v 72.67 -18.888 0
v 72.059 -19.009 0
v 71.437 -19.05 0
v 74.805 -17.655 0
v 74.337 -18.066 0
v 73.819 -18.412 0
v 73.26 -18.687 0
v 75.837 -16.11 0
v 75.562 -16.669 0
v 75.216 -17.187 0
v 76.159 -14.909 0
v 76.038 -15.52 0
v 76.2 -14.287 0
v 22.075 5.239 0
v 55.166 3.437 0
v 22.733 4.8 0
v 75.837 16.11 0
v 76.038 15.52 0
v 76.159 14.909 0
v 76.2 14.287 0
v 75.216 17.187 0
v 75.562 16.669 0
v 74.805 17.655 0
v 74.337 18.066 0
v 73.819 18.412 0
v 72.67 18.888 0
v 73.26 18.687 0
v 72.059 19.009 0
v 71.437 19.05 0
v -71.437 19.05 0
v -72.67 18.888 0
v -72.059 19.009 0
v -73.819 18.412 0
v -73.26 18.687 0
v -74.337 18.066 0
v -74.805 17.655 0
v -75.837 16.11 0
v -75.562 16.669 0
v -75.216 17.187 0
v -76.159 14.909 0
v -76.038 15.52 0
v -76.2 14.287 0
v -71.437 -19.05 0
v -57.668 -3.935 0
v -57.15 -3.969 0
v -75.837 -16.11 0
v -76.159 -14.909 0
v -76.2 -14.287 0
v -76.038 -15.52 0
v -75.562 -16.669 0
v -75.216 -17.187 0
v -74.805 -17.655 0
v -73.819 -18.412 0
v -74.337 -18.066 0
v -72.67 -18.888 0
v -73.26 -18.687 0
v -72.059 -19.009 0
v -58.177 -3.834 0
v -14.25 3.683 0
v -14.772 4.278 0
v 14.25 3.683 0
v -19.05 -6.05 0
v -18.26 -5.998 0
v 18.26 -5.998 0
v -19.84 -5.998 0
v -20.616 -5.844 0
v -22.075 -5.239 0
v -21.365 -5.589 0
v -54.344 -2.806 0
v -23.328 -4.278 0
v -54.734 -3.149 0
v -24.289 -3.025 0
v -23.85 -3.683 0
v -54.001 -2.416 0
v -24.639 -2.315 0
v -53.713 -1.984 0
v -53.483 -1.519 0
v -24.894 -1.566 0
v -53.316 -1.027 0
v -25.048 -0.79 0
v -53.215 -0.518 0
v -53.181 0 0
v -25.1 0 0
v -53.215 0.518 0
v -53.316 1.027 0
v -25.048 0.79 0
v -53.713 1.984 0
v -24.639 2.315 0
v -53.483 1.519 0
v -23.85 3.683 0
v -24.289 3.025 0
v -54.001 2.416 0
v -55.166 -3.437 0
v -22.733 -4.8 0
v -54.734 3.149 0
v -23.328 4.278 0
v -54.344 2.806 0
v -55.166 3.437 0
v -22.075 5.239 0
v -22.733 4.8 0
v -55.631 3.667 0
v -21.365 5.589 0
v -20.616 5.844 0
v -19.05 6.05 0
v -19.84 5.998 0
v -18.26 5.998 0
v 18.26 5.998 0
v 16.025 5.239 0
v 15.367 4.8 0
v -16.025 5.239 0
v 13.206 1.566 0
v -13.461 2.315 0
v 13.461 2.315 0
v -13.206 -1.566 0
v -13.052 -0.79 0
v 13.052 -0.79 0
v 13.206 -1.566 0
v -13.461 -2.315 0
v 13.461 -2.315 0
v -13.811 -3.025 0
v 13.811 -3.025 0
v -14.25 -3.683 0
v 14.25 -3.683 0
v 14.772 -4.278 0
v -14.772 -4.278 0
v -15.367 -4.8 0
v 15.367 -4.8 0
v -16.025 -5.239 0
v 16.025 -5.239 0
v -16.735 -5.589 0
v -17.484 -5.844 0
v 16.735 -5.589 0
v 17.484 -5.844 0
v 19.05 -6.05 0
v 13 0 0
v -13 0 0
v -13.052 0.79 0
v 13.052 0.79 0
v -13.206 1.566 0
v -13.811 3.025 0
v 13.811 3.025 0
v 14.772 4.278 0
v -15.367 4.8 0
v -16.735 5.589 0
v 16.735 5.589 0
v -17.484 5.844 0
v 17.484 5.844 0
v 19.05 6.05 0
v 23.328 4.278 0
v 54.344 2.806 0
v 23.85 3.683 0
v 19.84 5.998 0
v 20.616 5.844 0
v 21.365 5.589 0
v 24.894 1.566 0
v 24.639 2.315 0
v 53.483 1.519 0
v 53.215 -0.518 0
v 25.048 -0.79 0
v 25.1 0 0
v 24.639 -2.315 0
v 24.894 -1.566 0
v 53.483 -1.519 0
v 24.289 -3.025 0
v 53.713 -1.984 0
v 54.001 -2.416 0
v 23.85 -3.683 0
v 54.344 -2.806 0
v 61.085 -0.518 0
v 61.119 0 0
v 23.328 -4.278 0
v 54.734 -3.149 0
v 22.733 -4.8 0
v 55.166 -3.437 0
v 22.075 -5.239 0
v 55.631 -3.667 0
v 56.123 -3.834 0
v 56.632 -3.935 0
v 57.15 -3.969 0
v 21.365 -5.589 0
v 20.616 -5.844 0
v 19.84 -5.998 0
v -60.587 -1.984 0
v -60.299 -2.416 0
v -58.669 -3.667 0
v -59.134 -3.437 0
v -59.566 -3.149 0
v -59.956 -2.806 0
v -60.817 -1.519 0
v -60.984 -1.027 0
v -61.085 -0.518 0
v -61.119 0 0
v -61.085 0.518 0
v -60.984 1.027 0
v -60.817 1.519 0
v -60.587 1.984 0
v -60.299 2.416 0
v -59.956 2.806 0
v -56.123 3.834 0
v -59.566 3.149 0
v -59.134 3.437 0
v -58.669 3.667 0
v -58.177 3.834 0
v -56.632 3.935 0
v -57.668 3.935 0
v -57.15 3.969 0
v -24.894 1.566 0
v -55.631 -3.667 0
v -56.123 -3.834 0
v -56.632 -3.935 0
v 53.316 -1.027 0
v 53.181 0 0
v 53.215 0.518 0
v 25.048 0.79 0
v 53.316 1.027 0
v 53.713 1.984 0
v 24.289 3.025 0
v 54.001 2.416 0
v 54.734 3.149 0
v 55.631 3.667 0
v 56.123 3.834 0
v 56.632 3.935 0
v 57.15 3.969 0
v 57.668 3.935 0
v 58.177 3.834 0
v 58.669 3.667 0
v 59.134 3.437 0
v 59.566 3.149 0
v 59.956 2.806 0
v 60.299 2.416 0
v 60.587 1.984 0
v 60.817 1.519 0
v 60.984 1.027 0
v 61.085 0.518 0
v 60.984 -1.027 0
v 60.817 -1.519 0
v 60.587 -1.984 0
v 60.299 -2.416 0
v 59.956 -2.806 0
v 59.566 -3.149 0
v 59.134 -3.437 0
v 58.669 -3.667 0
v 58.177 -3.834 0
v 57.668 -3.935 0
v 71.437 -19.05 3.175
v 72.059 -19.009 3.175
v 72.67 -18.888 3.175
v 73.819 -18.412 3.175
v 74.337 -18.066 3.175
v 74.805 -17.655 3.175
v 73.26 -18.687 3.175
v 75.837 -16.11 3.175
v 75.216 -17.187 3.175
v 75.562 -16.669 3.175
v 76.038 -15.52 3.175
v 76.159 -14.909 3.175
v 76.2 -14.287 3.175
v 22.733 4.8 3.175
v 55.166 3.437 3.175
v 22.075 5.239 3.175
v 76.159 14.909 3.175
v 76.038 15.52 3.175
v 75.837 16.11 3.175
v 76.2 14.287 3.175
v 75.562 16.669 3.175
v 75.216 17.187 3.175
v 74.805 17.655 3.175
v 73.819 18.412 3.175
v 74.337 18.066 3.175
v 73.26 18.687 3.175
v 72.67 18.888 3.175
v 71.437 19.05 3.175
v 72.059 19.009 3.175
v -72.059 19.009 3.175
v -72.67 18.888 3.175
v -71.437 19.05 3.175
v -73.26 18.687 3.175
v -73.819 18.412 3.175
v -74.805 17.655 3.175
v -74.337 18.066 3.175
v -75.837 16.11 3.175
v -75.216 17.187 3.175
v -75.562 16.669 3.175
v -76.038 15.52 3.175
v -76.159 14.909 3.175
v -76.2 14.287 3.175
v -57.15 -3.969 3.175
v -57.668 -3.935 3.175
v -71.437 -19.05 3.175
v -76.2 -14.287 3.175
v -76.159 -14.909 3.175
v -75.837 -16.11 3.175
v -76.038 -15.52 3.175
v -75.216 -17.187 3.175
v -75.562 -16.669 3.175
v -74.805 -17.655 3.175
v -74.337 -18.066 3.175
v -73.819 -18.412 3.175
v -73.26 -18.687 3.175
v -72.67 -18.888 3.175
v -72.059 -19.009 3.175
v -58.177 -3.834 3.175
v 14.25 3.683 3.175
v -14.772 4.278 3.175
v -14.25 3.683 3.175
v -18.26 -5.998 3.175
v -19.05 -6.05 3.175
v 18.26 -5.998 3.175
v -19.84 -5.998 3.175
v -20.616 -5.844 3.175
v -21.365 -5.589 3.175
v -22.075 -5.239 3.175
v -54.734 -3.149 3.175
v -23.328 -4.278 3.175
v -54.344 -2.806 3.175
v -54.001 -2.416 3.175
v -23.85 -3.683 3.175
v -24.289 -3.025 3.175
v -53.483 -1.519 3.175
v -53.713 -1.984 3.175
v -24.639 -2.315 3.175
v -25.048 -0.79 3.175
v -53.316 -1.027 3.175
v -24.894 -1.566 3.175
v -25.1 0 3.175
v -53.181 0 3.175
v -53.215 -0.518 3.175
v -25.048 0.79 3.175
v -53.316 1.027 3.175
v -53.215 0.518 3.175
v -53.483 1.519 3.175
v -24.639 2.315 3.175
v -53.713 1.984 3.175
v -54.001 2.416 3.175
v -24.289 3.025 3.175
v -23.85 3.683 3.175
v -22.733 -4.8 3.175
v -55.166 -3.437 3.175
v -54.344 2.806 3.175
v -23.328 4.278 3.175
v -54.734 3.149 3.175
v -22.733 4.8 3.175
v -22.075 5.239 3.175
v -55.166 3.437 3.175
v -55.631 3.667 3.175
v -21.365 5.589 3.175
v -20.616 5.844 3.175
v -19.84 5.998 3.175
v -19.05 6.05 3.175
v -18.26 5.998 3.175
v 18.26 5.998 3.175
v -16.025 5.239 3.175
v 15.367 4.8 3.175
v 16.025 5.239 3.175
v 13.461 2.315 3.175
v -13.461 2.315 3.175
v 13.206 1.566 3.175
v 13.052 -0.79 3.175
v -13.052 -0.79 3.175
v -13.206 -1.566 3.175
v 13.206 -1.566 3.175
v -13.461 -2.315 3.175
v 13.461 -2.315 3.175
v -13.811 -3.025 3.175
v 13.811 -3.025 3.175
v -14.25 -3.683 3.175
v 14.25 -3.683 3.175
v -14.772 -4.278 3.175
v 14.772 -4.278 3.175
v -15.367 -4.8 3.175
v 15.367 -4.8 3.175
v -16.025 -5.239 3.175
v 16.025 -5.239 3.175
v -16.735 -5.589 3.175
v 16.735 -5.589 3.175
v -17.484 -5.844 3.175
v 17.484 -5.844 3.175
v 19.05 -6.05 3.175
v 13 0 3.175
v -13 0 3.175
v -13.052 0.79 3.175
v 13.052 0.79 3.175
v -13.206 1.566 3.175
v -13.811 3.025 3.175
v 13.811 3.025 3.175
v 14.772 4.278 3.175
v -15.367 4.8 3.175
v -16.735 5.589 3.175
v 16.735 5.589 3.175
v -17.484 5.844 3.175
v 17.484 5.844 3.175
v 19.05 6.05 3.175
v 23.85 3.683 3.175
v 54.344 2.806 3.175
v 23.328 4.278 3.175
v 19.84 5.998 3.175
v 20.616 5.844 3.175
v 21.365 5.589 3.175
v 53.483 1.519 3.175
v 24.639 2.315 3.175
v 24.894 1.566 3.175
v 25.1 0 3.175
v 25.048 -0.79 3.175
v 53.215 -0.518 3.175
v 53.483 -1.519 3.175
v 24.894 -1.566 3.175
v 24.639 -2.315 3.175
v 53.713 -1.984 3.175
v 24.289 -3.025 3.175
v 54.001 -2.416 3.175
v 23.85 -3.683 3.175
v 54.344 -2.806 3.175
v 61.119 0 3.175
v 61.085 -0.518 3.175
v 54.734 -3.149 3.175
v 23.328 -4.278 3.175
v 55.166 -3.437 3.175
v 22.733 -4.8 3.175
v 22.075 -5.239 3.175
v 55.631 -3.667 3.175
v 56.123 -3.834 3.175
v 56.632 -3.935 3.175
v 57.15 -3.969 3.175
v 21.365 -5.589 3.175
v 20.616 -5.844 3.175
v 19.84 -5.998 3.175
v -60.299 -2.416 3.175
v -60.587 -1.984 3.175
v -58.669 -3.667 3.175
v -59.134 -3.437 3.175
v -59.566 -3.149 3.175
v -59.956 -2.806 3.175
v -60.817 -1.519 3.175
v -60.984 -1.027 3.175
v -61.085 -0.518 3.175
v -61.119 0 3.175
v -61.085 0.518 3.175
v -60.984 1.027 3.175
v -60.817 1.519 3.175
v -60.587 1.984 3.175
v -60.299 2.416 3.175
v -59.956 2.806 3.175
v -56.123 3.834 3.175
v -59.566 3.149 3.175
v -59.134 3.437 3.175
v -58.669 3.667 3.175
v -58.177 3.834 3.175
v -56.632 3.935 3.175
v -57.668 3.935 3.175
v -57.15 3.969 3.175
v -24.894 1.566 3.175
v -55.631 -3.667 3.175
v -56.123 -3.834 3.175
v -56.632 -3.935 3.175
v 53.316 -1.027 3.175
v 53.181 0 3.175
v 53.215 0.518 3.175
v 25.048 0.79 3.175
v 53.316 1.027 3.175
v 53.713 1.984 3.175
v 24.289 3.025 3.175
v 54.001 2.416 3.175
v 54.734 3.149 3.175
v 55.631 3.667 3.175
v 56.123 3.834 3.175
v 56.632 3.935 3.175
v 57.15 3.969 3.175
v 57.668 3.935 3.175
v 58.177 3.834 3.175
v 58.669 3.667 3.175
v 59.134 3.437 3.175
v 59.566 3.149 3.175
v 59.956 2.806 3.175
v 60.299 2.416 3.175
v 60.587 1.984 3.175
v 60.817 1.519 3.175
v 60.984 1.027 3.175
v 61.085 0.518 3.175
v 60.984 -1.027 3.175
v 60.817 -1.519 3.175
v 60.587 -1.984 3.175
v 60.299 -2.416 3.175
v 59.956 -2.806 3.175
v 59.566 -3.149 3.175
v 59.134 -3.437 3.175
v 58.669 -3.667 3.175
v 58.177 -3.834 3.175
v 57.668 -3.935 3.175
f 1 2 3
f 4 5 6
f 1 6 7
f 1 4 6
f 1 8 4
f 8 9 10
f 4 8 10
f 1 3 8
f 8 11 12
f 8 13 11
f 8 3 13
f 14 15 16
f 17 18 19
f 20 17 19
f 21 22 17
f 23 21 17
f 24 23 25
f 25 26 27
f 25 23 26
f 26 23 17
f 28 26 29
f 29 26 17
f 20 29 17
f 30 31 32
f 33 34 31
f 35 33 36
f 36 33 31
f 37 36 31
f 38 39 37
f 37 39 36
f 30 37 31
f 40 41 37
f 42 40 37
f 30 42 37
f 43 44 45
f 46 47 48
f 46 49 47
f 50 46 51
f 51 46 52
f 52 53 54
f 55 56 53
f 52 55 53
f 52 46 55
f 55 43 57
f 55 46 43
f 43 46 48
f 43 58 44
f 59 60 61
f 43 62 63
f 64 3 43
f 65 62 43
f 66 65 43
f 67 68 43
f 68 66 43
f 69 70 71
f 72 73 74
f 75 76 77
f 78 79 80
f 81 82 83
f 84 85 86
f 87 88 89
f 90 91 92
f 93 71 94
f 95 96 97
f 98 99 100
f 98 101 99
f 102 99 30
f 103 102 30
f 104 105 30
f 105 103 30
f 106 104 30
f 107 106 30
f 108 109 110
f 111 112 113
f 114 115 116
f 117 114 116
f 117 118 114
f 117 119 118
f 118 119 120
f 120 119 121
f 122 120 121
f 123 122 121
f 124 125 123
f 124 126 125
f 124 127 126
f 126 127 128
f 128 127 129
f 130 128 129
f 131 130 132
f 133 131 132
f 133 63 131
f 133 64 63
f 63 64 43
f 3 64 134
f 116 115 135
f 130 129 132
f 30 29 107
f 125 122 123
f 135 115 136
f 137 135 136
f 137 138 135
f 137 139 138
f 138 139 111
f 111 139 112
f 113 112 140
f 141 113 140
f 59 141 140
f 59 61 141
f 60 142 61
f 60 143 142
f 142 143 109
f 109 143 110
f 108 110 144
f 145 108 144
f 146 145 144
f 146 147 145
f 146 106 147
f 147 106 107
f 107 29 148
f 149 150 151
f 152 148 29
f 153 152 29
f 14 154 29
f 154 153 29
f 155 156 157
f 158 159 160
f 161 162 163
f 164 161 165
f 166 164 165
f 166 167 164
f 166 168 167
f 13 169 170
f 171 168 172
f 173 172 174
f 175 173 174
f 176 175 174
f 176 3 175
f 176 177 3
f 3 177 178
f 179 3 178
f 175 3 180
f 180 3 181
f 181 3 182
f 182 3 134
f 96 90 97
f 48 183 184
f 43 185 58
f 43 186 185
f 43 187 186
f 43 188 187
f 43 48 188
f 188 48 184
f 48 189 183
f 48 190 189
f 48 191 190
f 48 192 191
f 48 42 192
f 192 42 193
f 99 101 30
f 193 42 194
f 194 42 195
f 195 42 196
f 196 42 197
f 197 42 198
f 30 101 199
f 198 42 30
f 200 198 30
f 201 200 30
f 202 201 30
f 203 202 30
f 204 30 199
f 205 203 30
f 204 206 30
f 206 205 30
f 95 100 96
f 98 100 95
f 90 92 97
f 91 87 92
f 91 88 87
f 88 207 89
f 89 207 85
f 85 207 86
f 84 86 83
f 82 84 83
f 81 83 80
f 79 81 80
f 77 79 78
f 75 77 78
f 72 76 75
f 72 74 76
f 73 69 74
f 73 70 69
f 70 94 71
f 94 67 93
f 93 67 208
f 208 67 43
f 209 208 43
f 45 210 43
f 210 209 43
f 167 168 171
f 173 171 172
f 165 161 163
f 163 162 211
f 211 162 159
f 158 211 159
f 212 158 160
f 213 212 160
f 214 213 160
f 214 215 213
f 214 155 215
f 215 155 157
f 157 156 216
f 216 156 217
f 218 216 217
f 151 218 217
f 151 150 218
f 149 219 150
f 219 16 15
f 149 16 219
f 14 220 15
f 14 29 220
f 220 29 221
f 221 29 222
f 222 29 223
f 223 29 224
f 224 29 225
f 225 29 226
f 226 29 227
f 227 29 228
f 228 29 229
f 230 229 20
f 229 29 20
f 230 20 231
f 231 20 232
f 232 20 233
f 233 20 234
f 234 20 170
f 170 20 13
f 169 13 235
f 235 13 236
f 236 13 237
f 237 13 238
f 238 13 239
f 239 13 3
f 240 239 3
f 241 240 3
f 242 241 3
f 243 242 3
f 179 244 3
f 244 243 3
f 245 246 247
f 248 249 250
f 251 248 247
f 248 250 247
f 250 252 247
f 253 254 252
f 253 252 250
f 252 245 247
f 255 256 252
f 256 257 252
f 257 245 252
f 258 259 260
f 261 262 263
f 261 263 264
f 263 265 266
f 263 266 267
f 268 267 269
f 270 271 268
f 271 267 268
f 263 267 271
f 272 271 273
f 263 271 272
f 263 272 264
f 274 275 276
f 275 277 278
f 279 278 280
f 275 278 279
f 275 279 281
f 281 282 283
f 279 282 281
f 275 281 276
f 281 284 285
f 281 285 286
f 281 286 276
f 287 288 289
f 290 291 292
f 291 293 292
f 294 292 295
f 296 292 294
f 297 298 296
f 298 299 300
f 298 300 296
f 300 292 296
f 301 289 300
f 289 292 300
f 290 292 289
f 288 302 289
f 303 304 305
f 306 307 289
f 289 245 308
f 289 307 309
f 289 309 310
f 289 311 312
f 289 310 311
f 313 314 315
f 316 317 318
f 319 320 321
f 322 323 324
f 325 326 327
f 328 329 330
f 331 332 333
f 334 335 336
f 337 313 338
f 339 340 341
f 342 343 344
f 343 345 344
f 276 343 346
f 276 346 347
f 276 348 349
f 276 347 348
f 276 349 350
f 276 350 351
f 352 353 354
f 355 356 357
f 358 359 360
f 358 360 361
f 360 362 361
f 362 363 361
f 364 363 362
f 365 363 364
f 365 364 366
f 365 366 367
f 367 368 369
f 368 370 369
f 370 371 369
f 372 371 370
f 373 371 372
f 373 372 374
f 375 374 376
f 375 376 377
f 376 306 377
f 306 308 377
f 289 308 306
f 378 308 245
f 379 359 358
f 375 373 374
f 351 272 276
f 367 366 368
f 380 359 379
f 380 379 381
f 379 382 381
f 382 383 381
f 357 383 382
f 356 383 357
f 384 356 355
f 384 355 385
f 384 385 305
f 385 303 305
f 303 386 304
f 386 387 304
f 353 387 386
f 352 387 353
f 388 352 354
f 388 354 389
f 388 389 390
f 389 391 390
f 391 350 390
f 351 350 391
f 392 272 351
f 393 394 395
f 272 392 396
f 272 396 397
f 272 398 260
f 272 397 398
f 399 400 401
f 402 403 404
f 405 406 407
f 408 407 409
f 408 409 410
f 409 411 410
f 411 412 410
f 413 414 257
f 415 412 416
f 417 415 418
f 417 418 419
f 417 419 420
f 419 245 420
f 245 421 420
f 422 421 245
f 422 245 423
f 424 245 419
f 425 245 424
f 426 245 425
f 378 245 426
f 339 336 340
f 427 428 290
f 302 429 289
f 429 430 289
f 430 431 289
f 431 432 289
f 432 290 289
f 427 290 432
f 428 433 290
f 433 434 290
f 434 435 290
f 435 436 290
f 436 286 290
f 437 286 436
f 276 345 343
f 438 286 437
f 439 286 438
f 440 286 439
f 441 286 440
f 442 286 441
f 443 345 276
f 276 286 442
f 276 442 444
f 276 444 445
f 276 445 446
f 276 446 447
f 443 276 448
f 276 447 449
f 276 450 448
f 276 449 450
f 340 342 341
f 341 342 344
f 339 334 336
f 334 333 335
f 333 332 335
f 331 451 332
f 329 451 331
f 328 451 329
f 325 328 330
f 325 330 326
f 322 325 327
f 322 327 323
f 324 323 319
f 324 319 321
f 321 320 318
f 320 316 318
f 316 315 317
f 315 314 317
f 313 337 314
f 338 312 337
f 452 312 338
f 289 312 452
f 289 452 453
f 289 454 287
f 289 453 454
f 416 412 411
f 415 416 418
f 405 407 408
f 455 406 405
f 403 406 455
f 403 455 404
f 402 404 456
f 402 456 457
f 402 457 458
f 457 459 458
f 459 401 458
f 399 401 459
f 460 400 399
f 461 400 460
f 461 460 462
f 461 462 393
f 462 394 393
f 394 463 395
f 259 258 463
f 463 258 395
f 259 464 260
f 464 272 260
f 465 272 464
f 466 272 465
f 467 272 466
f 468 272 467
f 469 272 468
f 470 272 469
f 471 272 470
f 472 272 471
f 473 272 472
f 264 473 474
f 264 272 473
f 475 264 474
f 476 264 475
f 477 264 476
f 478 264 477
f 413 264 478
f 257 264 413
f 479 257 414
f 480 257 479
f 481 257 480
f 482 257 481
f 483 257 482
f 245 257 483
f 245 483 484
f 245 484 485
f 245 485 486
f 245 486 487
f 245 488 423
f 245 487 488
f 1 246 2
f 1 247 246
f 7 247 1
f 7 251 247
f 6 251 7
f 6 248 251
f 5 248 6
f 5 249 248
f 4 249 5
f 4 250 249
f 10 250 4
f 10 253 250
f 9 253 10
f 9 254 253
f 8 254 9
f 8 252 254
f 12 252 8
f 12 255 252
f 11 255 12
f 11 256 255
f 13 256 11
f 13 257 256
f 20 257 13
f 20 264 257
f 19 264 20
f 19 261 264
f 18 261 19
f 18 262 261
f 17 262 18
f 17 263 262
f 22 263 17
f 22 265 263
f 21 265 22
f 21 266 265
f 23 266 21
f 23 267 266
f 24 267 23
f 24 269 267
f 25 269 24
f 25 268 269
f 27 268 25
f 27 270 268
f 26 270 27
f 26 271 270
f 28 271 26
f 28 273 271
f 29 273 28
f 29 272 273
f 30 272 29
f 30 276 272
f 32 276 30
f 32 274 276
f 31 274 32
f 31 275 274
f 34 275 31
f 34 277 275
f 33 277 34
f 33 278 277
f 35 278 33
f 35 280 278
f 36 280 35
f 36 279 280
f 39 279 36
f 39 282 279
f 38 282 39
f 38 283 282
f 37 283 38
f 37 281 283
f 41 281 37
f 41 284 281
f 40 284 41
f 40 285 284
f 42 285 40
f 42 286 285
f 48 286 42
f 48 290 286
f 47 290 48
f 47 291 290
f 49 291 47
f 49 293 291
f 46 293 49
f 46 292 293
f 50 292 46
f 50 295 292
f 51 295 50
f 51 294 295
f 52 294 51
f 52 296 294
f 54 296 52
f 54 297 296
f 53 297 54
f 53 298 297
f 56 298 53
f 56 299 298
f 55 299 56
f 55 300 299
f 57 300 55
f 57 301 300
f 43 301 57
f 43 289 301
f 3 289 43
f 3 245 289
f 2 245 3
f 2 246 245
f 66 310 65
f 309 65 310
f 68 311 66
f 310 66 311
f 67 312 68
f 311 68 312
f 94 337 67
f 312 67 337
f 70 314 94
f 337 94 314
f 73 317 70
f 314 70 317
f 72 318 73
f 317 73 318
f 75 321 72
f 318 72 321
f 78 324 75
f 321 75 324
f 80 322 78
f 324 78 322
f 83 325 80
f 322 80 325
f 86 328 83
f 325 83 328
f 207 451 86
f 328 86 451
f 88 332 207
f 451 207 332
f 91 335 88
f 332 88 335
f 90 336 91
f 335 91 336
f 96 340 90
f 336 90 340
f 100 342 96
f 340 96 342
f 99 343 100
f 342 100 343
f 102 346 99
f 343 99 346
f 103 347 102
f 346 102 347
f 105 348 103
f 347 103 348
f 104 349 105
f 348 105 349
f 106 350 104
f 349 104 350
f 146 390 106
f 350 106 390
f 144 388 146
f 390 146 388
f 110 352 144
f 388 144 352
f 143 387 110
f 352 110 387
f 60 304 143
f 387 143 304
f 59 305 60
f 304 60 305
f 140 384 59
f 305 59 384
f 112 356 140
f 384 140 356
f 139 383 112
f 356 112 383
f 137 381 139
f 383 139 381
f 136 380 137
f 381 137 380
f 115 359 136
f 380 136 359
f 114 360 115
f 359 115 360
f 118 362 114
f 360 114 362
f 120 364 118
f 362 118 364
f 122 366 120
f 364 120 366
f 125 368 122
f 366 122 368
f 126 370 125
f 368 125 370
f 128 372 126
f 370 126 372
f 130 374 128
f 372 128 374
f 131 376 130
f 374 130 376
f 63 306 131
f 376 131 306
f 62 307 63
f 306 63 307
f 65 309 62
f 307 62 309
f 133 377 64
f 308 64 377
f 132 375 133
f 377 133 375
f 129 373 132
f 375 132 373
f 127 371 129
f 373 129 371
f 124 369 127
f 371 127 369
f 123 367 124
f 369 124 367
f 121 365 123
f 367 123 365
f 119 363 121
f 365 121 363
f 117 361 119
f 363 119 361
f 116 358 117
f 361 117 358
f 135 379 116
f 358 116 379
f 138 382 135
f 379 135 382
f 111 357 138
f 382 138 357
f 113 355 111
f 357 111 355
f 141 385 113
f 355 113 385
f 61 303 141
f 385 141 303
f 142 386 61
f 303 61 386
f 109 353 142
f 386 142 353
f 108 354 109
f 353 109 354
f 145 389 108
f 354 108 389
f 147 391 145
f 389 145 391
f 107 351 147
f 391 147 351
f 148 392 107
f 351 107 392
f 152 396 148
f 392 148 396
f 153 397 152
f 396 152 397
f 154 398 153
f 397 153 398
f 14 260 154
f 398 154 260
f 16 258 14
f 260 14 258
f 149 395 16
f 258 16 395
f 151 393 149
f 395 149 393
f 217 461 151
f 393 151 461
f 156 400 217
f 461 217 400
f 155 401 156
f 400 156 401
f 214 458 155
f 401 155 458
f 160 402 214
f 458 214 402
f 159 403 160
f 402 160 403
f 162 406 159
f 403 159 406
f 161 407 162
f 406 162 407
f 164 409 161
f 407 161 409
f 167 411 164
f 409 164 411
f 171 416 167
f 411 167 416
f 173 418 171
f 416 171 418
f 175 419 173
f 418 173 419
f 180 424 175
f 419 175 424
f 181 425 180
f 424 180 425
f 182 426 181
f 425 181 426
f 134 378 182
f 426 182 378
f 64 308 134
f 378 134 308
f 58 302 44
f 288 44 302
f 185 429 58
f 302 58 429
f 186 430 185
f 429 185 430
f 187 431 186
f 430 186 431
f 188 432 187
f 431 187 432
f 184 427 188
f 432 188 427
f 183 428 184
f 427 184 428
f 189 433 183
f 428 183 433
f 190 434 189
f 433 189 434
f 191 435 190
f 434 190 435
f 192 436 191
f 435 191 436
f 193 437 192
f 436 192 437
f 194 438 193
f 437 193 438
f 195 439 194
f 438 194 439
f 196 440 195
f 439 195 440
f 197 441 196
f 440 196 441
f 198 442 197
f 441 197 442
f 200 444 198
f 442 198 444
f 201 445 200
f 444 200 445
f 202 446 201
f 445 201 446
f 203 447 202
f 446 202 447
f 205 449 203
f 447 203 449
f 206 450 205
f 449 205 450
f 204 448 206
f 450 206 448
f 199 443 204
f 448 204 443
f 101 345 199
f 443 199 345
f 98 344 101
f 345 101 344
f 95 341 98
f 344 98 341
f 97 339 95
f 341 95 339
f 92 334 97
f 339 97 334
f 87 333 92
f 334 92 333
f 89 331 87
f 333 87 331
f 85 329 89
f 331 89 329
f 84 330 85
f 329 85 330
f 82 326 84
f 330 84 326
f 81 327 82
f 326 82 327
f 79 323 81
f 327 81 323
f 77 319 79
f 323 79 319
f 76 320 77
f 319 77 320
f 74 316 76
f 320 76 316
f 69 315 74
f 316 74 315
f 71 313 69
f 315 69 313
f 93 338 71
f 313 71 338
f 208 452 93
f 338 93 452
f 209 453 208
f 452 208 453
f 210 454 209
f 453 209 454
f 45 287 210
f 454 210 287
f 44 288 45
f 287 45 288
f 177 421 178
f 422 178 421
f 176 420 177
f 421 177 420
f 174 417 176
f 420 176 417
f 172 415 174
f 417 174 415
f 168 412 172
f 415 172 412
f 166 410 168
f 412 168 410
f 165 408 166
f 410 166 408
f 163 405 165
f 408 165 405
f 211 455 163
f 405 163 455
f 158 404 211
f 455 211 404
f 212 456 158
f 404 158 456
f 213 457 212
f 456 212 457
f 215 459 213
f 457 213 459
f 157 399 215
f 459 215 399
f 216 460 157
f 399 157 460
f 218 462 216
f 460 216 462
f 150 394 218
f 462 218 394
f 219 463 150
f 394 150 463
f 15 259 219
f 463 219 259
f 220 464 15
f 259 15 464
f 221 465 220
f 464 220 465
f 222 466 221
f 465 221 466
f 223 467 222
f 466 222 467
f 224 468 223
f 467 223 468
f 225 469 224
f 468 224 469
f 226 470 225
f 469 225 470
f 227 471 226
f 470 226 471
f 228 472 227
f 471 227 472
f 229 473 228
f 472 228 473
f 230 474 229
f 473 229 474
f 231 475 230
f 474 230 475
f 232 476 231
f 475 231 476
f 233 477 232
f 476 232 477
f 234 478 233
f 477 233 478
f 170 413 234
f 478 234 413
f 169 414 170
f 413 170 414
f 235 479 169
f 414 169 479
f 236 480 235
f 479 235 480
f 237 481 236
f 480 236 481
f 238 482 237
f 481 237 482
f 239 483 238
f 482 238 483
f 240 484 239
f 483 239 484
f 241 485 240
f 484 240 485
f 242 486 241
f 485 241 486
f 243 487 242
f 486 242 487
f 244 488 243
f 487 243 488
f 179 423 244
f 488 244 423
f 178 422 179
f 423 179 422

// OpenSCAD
// file: ../lib/TOGUnitTable-v1.scad
// TOGUnitTable-v1.1.0 - Library for handling 'complex amounts' in the form of [multiplier, unit name], e.g. [1.5, "inch"]
//
// 2023-07-01: the following 'annotation' is something I just made up,
// but is intended as a way for future packaging tools to know that it's 'safe'
// (because everything has been somewhat namespaced) to turn a `use <x>`
// into an `include <x>`, making it inlinable:
// safe-to-include: true
// 
// Versions:
// v1.0.0:
// - Created it.
// v1.1.0:
// - Add optional 'dbgctxstr' parameter to unit decoding functions, for better error messages
// 
// Naming convention:
// Doing 'OO without classes', here.
// Fully qualified name = class or package name + "__" + member name
// Class or package name may itself be namespaced, and class names may double as package names.
// Here, tog_unittable names both a class and a package.

// Demo unit table uses 'micrometer' as the base unit
// in order to keep multipliers as integers as much as possible.
tog_unittable__demo_unit_table = [
	["um",    [    1   ,   "um"], "micrometer" ],
	["mm",    [ 1000   ,   "um"], "millimeter" ],
	["inch",  [25400   ,   "um"], "inch"       ],
	["u",     [    1/16, "inch"], "model unit" ], // As used by TGx9 et al
	["atom",  [    8   ,    "u"], "model atom" ],
	["chunk", [    3   , "atom"], "model chunk"],
];

use <./DbgCtxStrLib1.scad>

function tog_unittable__list__filter(list, predicate) = [
	for( item=list ) if( predicate(item) ) item
];
function tog_unittable__list__first(list, on_error) =
	len(list) > 0 ? list[0] : on_error();

function tog_unittable__unit_value_ca(unit_table, unit_name, dbgctxstr=undef) =
	tog_unittable__list__first(
		tog_unittable__list__filter(unit_table, function (entry) entry[0] == unit_name),
		function () assert(false,
			str("Did not find entry for unit '", unit_name, "' in unit table", dbgctxstr_errmsg_suffix(dbgctxstr))
		)
	)[1];

function tog_unittable__ca__is_valid( ca ) =
	is_list(ca) && len(ca) == 2;

// Break down 'amount' until it is in a base unit (one which is defined in terms of itself)
function tog_unittable__simplify_ca(unit_table, amount, dbgctxstr=undef) =
	assert( tog_unittable__ca__is_valid(amount), str(amount, " is not a valid Complex Amount (should be [numeric_value, \"unit_name\"])", dbgctxstr=dbgctxstr) )
	let( unit_value_ca = tog_unittable__unit_value_ca(unit_table, amount[1], dbgctxstr=dbgctxstr) )
	unit_value_ca[1] == amount[1] ? amount :
		tog_unittable__simplify_ca(unit_table, [amount[0] * unit_value_ca[0], unit_value_ca[1]]);

function tog_unittable__divide_ca(unit_table, numerator, denominator, dbgctxstr=undef) =
	let(
		numerator_base_ca   = tog_unittable__simplify_ca(unit_table, numerator, dbgctxstr=dbgctxstr),
		denominator_base_ca = tog_unittable__simplify_ca(unit_table, denominator, dbgctxstr=dbgctxstr)
	)
	assert(numerator_base_ca[1] == denominator_base_ca[1], str("Different base units found for ", numerator[1], " and ", denominator[1]))
	numerator_base_ca[0] / denominator_base_ca[0];	

assert(tog_unittable__divide_ca(tog_unittable__demo_unit_table, [1,   "mm"], [  1, "mm"]) ==     1   );
assert(tog_unittable__divide_ca(tog_unittable__demo_unit_table, [1,   "mm"], [  1, "um"]) ==  1000   );
assert(tog_unittable__divide_ca(tog_unittable__demo_unit_table, [1, "inch"], [  1, "um"]) == 25400   );
assert(tog_unittable__divide_ca(tog_unittable__demo_unit_table, [1, "inch"], [  1, "mm"]) ==    25.4 );
assert(tog_unittable__divide_ca(tog_unittable__demo_unit_table, [1, "inch"], [254, "um"]) ==   100   );
assert(tog_unittable__divide_ca(tog_unittable__demo_unit_table, [1,    "u"], [  1, "um"]) ==  1587.5 );
// file: ../lib/TOGStringLib1.scad
// TOGStringLib1.7
// 
// Functions for parsing quantities
// and other misc. string handling.
// 
// v1.5
// - togstr1_parse_quantity will treat unit-only strings as meaning 1/1 of that unit.
//   e.g. togstr1_parse_quantity("foot") = [[[1,1], "foot", 4]]
// v1.6:
// - togstr1_parse_quantity allows unit name to be omitted when quantity is zero and $togunits1_default_unit is defined
// v1.7:
// - Add optional 'dbgctxstr' parameter to unit decoding functions, for better error messages
// 
// Globals: $togunits1_default_unit - affects what 'unit' is returned
// when interpreting numbers or strings that lack the unit.


function togstr1__todo(message) = assert(false, str("TODO: ", message));

module togstr1__assert_eq(a, b) {
	if( a != b ) {
		assert( a == b, str(a, " != ", b) );
	}
}



function togstr1_slice(source, i0, i1) =
	i0 == i1 ? "" :
	str(source[i0], togstr1_slice(source, i0+1, i1));

function togstr1_tokenize(source, sep, maxcount=9999, i=0, tokenstart=0) =
	len(source) == i ? (
		(tokenstart < i) ? [togstr1_slice(source, tokenstart, i)] : []
	) :
	source[i] == sep ? (
		(tokenstart < i) ? concat([togstr1_slice(source, tokenstart, i)], togstr1_tokenize(source, sep, maxcount-1, i+1, i+1)) :
		togstr1_tokenize(source, sep, maxcount, i+1, i+1)
	) :
	maxcount <= 1 ? [togstr1_slice(source, tokenstart, len(source))] :
	togstr1_tokenize(source, sep, maxcount, i+1, tokenstart);

togstr1__assert_eq( ["foo","bar","baz"], togstr1_tokenize("foo-bar-baz", "-") );
// Duplicate delimiters are ignored
togstr1__assert_eq( ["foo","bar","baz"], togstr1_tokenize("foo--bar--baz", "-") );
// Trailing delimiters are ignored
togstr1__assert_eq( ["foo","bar","baz"], togstr1_tokenize("foo--bar--baz--", "-") );
// Leading delimiters are ignored
togstr1__assert_eq( ["foo","bar","baz"], togstr1_tokenize("--foo--bar--baz", "-") );
// Can limit number of tokens returned
togstr1__assert_eq( ["foo","bar-baz"], togstr1_tokenize("foo-bar-baz", "-", 2) );
togstr1__assert_eq( ["foo","bar-baz"], togstr1_tokenize("--foo--bar-baz", "-", 2) );
togstr1__assert_eq( ["foo","bar--baz"], togstr1_tokenize("--foo--bar--baz", "-", 2) );
togstr1__assert_eq( ["foo"], togstr1_tokenize("--foo--", "-", 2) );




/** \d+ -> [num, end_index] */
function togstr1_parse_decimal_nat(str, index=0, current=0, dbgctxstr=undef) =
	len(str) == index ? [current, index] :
	let( dig = ord(str[index]) - ord("0") )
	(dig >= 0 && dig <= 9) ? togstr1_parse_decimal_nat(str, index+1, current*10 + dig, dbgctxstr=dbgctxstr) :
	[current, index];

togstr1__assert_eq( [123,3], togstr1_parse_decimal_nat("123") );
togstr1__assert_eq( [123,3], togstr1_parse_decimal_nat("123.45") );

/** [+-]*\d+ ->  [[num, den], end_index] */
function togstr1_parse_decimal_number(str, index=0, dbgctxstr=undef) =
	str[index] == "+" ? togstr1_parse_decimal_number(str, index+1) :
	str[index] == "-" ? let(r=togstr1_parse_decimal_number(str, index+1)) [[-r[0][0], r[0][1]], r[1]] :
	let(r = togstr1_parse_decimal_nat(str, index, dbgctxstr=dbgctxstr))
	str[r[1]] != "." ? [[r[0], 1], r[1]] :
	let(fracr = togstr1_parse_decimal_nat(str, r[1]+1))
	let(mult = pow(10, fracr[1]-(r[1]+1)))
	[[r[0]*mult + fracr[0], mult], fracr[1]];

togstr1__assert_eq( [[   36,   1], 2], togstr1_parse_decimal_number( "36"   ) );
togstr1__assert_eq( [[ 3524, 100], 5], togstr1_parse_decimal_number( "35.24") );
togstr1__assert_eq( [[-3524, 100], 6], togstr1_parse_decimal_number("-35.24") );
togstr1__assert_eq( [[    0,   1], 0], togstr1_parse_decimal_number( "NotANumber") );

function togstr1__gcd(a, b) = b == 0 ? abs(a) : togstr1__gcd(b, a % b);

togstr1__assert_eq(10, togstr1__gcd(10, 20));
togstr1__assert_eq( 5, togstr1__gcd(10, 15));
togstr1__assert_eq( 2, togstr1__gcd(10, 14));


function togstr1__normalize_rat(rat) =
	let(gcd = togstr1__gcd(rat[0], rat[1]))
	// TODO: find LCD, divide top and bottom by it
	rat[0] < 0 && rat[1] < 0 ? [-rat[0]/gcd, -rat[1]/gcd] :
	[rat[0]/gcd, rat[1]/gcd];

/** <decnum>[/<decnum>] -> [[num, den], end_index] */
function togstr1__multiply_rat(a, b) =
	togstr1__normalize_rat(
		a[1] == b[1] ? [a[0]*b[0]/a[1], a[1]] : // TODO: LCD instead of special case
		[a[0]*b[0], a[1]*b[1]]
	);
function togstr1__divide_rat(a, b) = togstr1__normalize_rat([a[0]*b[1], a[1]*b[0]]);


function togstr1__add_rat(a, b) =
	togstr1__normalize_rat([a[0]*b[1] + b[0]*a[1], a[1]*b[1]]);
	
togstr1__assert_eq([1, 2], togstr1__add_rat([1, 3], [1, 6]));


/** Return [[num, den], end_index] */
function togstr1_parse_rational_number(str, index=0, dbgctxstr=undef) =
	let( numr = togstr1_parse_decimal_number(str, index, dbgctxstr=dbgctxstr) )
	str[numr[1]] == "+" ?
		let(numrb = togstr1_parse_rational_number(str, numr[1]+1, dbgctxstr=dbgctxstr))
		[togstr1__add_rat(numr[0], numrb[0]), numrb[1]]	:
	str[numr[1]] == "/" ?
		let( denr = togstr1_parse_decimal_number(str, numr[1]+1, dbgctxstr=dbgctxstr) )
		[togstr1__divide_rat(numr[0], denr[0]), denr[1]] :
	numr;

togstr1__assert_eq( [[   123,  1],3], togstr1_parse_rational_number( "123") );
togstr1__assert_eq( [[   123,  1],4], togstr1_parse_rational_number("+123") );
togstr1__assert_eq( [[-  123,  1],4], togstr1_parse_rational_number("-123") );
togstr1__assert_eq( [[   123,  1],6], togstr1_parse_rational_number("-+-123") );
togstr1__assert_eq( [[ 12345,100],6], togstr1_parse_rational_number("123.45") );
togstr1__assert_eq( [[  2469, 40],8], togstr1_parse_rational_number("123.45/2") );
togstr1__assert_eq( [[-  823,160],10], togstr1_parse_rational_number("-123.45/24") );
togstr1__assert_eq( [[     4,  3],5], togstr1_parse_rational_number( "1+1/3") );
togstr1__assert_eq( [[     0,  1],0], togstr1_parse_rational_number( "NotANumber!!") );


/** Return [[[num, den], unit], end_index] */
function togstr1_parse_quantity(str, dbgctxstr=undef) =
	let( numr = togstr1_parse_rational_number(str, dbgctxstr=dbgctxstr) )
	// For now, just let the unit be the rest of the string;
	// can revisit to stop at delimiters if needed in the future.
	numr[1] > 0 && numr[1] == len(str) && numr[0][0] == 0 && !is_undef($togunits1_default_unit) ? [[[0,1], $togunits1_default_unit], numr[1]] :
	assert( numr[1] < len(str), str("Quantity string missing unit: '", str, "'; note that '0' is acceptable if $togunits1_default_unit is defined"))
	let( unit = togstr1_slice(str, numr[1], len(str)) )
	let( quant = numr[1] > 0 ? numr[0] : [1,1] ) // No number = 1 (possibly this should be an error instead)
	[[quant, unit], len(str)];

togstr1__assert_eq( [[[  3,  1], "acre"],  5], togstr1_parse_quantity("3acre") );
togstr1__assert_eq( [[[  3,  5], "acre"],  7], togstr1_parse_quantity("3/5acre") );
togstr1__assert_eq( [[[301,500], "acre"], 10], togstr1_parse_quantity("3.01/5acre") );
togstr1__assert_eq( [[[  1,  1], "acre"],  4], togstr1_parse_quantity("acre") ); // Should either treat as one or throw an error!
togstr1__assert_eq( [[[  0,  1],"hectare"],1], togstr1_parse_quantity("0", $togunits1_default_unit="hectare") ); // Zero is fine if $togunits1_default_unit is defined
// file: ../lib/TOGridLib3.scad
// TOGridPileLib-v3.4
// 
// HOKAY WHAT ARE THE COMMON
// things that I want the library to do?
// 
// - [X] Be `include`-able, to make inlining easy
// - [X] Allow unit table to be overridden easily, but default by default
// - [ ] Support common configurations by name (e.g. "V9", or some "WSTYPE-...")
//   without having to pass 50 different parameters in
// - [ ] Support subtractions for those common configurations also,
//   such that you don't need to remember to 'do less rounding', etc.
// - [ ] Make a simple foot-only block that I can subtract stuff from
//   params: foot style
// - [ ] Make a block with a lip
// - [ ] Make a block foot, and I'll intersect it with some other things
// - [X] Translate a block_size_ca to mm
// 
// Changes:
// v3.1:
// - s/togridpile3_decode_size/togridpile3_decode_vector/
// v3.2:
// - togridpile3_decode(num) = num
// v3.3:
// - Change prefix from `togridpile3` to `togridlib3`
// v3.4:
// - Add optional 'dbgctxstr' parameter to unit decoding functions, for better error messages

use <../lib/TOGUnitTable-v1.scad>

function togridlib3_map(arr, fn) = [ for(item=arr) fn(item) ];

togridlib3_default_unit_table = [
	["um",    [    1,               "um"]],
	["mm",    [ 1000,               "um"]],
	["inch",  [25400,               "um"]],
	["u",     [    1.5875,          "mm"]],
	["atom",  [    8,                "u"]],
	["chunk", [    3,             "atom"]],
	["tgp-standard-bevel"   , [2,    "u"]], // Usuually 1/8"
	["m-outer-corner-radius", [4,    "u"]],
	["f-outer-corner-radius", [3,    "u"]],
];

function togridlib3_get_default_unit_table() = togridlib3_default_unit_table;
function togridlib3_get_unit_table() = is_undef($togridlib3_unit_table) ? togridlib3_default_unit_table : $togridlib3_unit_table;

function togridlib3_decode(dim, unit=[1, "mm"], unit_table=togridlib3_get_unit_table(), dbgctxstr=undef) =
	is_num(dim) ? dim : tog_unittable__divide_ca(unit_table, dim, unit, dbgctxstr=dbgctxstr);
function togridlib3_decode_vector(size, unit=[1, "mm"], unit_table=togridlib3_get_unit_table(), dbgctxstr=undef) =
	togridlib3_map(size, function(dim) is_num(dim) ? dim : tog_unittable__divide_ca(unit_table, dim, unit, dbgctxstr=dbgctxstr));

module togridlib3_cube(size, offset=0) {
	cube(togridlib3_decode_vector(size), center=true);
}
// file: ../lib/DbgCtxStrLib1.scad
// DbgCtxStrLib1.0
// 
// Library for dealing with 'debug context strings' (usually 'dbgctxstr').

function dbgctxstr_errmsg_suffix(dbgctxstr) =
	is_undef(dbgctxstr) || dbgctxstr == "" ? "" :
	str(" (", dbgctxstr, ")");
// file: ../lib/TOGArrayLib1.scad
// TOGArrayLib1.5
// 
// Functions for working with arrays.
// 
// v1.1:
// - tal1_reduce assert(is_list(items)) to prevent infinite recursion
//   when given undefined or other non-list values
// v1.1.1:
// - Fix tal1_uniq_remap_v2 to return "list-remap-result" as the
//   first element of the returned list
// v1.2:
// - Add tal1_replace_at function
// v1.3:
// - tal1_is_vec_of, tal1_is_vec_of_num
// v1.4:
// - tal1_assert_for_each, for when you want to assert something
//   about each of a list of items and get nice failure messages
// v1.5:
// - Add tal1_duplicate_reversed function, which may be
//   handy when generating symmetrical polygons and stuff.

/**
 * Make a list with the contents of list `a`,
 * but starting at offset `off`, replaced by the contents of list `b`.
 * len(result) = max(len(a), off+len(b))
 */
function tal1_replace_at(a, off, b, default_value=undef, default_value_function=undef) =
	assert(is_list(a))
	assert(is_list(b))
	let( _dvf = !is_undef(default_value_function) ? default_value_function : function(i) default_value )
[
	for( i=[0:1:min(off,len(a))-1] ) a[i],
	for( i=[len(a):1:off-1] ) _dvf(i),
	for( i=[off:1:off+len(b)-1] ) b[i-off],
	for( i=[off+len(b):1:len(a)-1] ) a[i],
];

// Simplest case
assert([] == tal1_replace_at([], 0, []));
// Second simplest cases
assert(["foo"] == tal1_replace_at(["foo"], 0, []));
assert(["foo"] == tal1_replace_at([], 0, ["foo"]));
// Replace one item
assert(["foo","quux","baz"] == tal1_replace_at(["foo","bar","baz"], 1, ["quux"]));
// Replace and extend
assert(["foo","quux","tuna","tina"] == tal1_replace_at(["foo","bar","baz"], 1, ["quux", "tuna", "tina"]));
// Add beyond end of `a`
assert(["foo","zzz","quux"] == tal1_replace_at(["foo"], 2, ["quux"], default_value="zzz"));
// Adding 'nothing' should still fill to that point with defaults
assert(["foo","zzz","zzz"] == tal1_replace_at(["foo"], 3, [], default_value="zzz"));


function tal1_reduce(start, items, func, offset=0) =
	assert(is_list(items))
	len(items) == offset ? start :
	tal1_reduce(func(start, items[offset]), items, func, offset+1);

function tal1_consecutive_duplicate_count(items) = tal1_reduce(
	[0, undef],
	items,
	function(z,item) [z[0] + (item == z[1] ? 1 : 0), item]
)[0];

assert(0 == tal1_consecutive_duplicate_count([]));
assert(0 == tal1_consecutive_duplicate_count([50]));
assert(1 == tal1_consecutive_duplicate_count([50,50]));
assert(0 == tal1_consecutive_duplicate_count([50,51,52,53]));
assert(1 == tal1_consecutive_duplicate_count([50,51,52,52]));
assert(3 == tal1_consecutive_duplicate_count([50,50,50,50]));

// Set test_size to arbirarily large values
// to ensure that OpenSCAD can handle heavy recursion
let(test_size=1000) assert(test_size/2 == tal1_consecutive_duplicate_count([for(i=[0:1:test_size-1]) floor(i/2)]));



function tal1_uniq_(items, off0, off1) =
	let(chunklen = off1-off0)
	chunklen == 0 ? [] :
	chunklen == 1 ? [items[off0]] :
	let(half=floor(chunklen/2))
	let(left  = tal1_uniq_(items, off0     , off0+half))
	let(right = tal1_uniq_(items, off0+half, off1     ))
	assert(len(left) > 0)
	assert(len(right) > 0)
	left[len(left)-1] == right[0] ? [each left, for(i=[1:1:len(right)-1]) right[i]] :
	[each left, each right];

/** Given a list of items, returns a new list with identical consecutive items merged */
function tal1_uniq(items) = tal1_uniq_(items, 0, len(items));

assert([] == tal1_uniq([]));
assert([123] == tal1_uniq([123]));
assert([55,0,1,2,3] == tal1_uniq([55,0,1,2,3]));
assert([55,0,1,2] == tal1_uniq([55,0,1,1,2]));
assert([55,0,1] == tal1_uniq([55,55,0,0,0,0,0,0,1,1,1,1]));
assert([55,0] == tal1_uniq([55,0,0,0,0,0,0,0]));



/**
 * Returns [new items, old index -> new index mapping].
 * No-op version.
 */
function tal1_uniq_remap_v1(items) =
	["list-remap-result", items, [for (vi=[0:1:len(items)-1]) vi]];

// [a, a, b, b, c, c]
//
// [a,    ...], []  -> [a],[0]
// [a, a, ...], [0] -> [a],[0,0]

assert([1,2,3] == [1,2,3]);

/**
 * Recursive version that will combine adjacent identical vertexes,
 * but will use the original items.
 */
function tal1_uniq_remap_v2(items, map=[]) =
	let(index = len(map))
	len(items) == index ? ["list-remap-result", items, map] :
	index == 0 ? tal1_uniq_remap_v2(items, [0]) :
	items[index] == items[map[index-1]] ? tal1_uniq_remap_v2(items, [for(vi=map) vi, map[index-1]]) :
	tal1_uniq_remap_v2(items, [for(vi=map) vi, index]);

assert(tal1_uniq_remap_v2([1,1,2,2,3,4]) == ["list-remap-result", [1,1,2,2,3,4], [0,0,2,2,4,5]]);


/**
 * Returns true if `vec` is a list of at least min_len items
 * and component_check(each item, even those beyond min_len) is true.
 */
function tal1_is_vec_of(vec, min_len=0, component_check=function(x) true) =
	assert(is_num(min_len) && min_len >= 0)
	assert(is_function(component_check))
	is_list(vec) && len(vec) >= min_len &&
	tal1_reduce(true, vec, function(prev,item) prev && component_check(item));

function tal1_is_vec_of_num(vec, min_len=0) = tal1_is_vec_of(vec, min_len, function(i) is_num(i));

assert( true == tal1_is_vec_of_num([1,2,3]));
assert( true == tal1_is_vec_of_num([]));
assert( true == tal1_is_vec_of_num([1,2,3], 3));
assert(false == tal1_is_vec_of_num([1,2], 3));
assert(false == tal1_is_vec_of_num([1,2,"spoon"], 3));
// Requirements are ambiguous when
// first min_len items are numbers, but there are non-numeric items afterwards,
// so let's error on the side of saying 'no, it's not a list of numbers';
// i.e. the item check and the min_len are independent.
assert(false == tal1_is_vec_of_num([1,2,3,"artichoke"], 3));


/**
 * Asserts that item_checker(each item in list, index of item)[0] is true.
 * Second element of item_checker return value is assertion message.
 * Returns the original list, in case that's useful to you.
 */
function tal1_assert_for_each(list, item_checker) =
	let( _ignored = [ for(i=[0:1:len(list)-1])
		let(q=item_checker(list[i],i))
		let(passed=is_bool(q) ? q : is_list(q) ? q[0] : assert(false, str(
			"tal1_assert_for_each: item_checker should return Bool|[Bool,String], but returned ",
			q, " for item at index ", i)))
		let(message=is_list(q) ? q[1] : undef)
		assert(passed, message)
		q
	])
	list;

// Callback can return a boolean...
assert([1,2,3] == tal1_assert_for_each([1,2,3], function(v,i) is_num(v)));
// ...or a [boolean, string]
assert([1,2,3] == tal1_assert_for_each([1,2,3], function(v,i) [is_num(v), "element be a num"]));

// [a, b, c] -> [a, b, c, rxf(c), rxf(b), rxf(a)]
function tal1_duplicate_reversed(list, rxf=function(item) item) =
	[
		each list,
		for( i=[len(list)-1 : -1 : 0] ) rxf(list[i]),
	];
// file: ../lib/TOGUnits1.scad
// TOGUnits1.7
// 
// For simlifying quantity parsing and unit conversion
// 
// v1.1:
// - Add `togunits1_decode` function
// v1.2:
// - Add togunits1_decode_vec
// v1.3:
// - Add togunits1_vec_to_cas
// v1.4:
// - Add togunits1_vec_to_mms
// v1.5:
// - Remove unused `unit` parameter from `togunits1_vec_to_cas`
// v1.6:
// - togunits1_decode accepts `xf` parameter, same as togunits1_decode_vec
// v1.7:
// - Add optional 'dbgctxstr' parameter to unit decoding functions, for better error messages
// 
// Reserved but not-yet-actually-used globals:
// - $togunits1_default_unit - default unit when interpreting "0"
//   - See TOGStringLib1
// - $togunits1_default_implied_unit - when interpreting quantities without unit, assume they have this one
//   - This might be a bad idea, so never implemented!

use <./DbgCtxStrLib1.scad>
use <./TOGridLib3.scad>
use <./TOGStringLib1.scad>

function togunits1__is_ca(what) =
	is_list(what) && len(what) == 2 && is_num(what[0]) && is_string(what[1]);

function togunits1__parse_to_ca(what, dbgctxstr=undef) =
	assert( is_string(what) )
	let( parseresult = togstr1_parse_quantity(what, dbgctxstr) )
	assert( parseresult[1] > 0, str("Failed to parse quantity from  ", what, dbgctxstr=dbgctxstr) )
	let( parsed = parseresult[0] )
	let( rat = parsed[0] )
	let( unit = parsed[1] )
	[rat[0]/rat[1], unit];

function togunits1_to_ca(what, dbgctxstr=undef) =
	is_string(what) ? togunits1__parse_to_ca(what, dbgctxstr=dbgctxstr) :
	togunits1__is_ca(what) ? what :
	is_num(what) ? [what, "mm"] :
	assert(false, str("Unrecognized quantity representation: ", what));

function togunits1_vec_to_cas(whats) =
	[for(w=whats) togunits1_to_ca(w)];

function togunits1__get_transform(name) =
	is_function(name) ? name :
	is_undef(name) ? function(n) n :
	name == "round" ? function(n) round(n) :
	name == "ceil" ? function(n) ceil(n) :
	assert(false, str("Unrecognized transform: '", name, "'"));

function togunits1_decode(what, unit=[1,"mm"], xf=undef, dbgctxstr=undef) =
	let( ca = togunits1_to_ca(what, dbgctxstr=dbgctxstr) )
	let( xf1 = togunits1__get_transform(xf) )
	xf1(togridlib3_decode(ca, unit=togunits1_to_ca(unit), dbgctxstr=dbgctxstr));

function togunits1_decode_vec(whats, unit=[1,"mm"], xf=undef) =
	let( unit_ca = togunits1_to_ca(unit) )
	let( xf1 = togunits1__get_transform(xf) )
	[for(w=whats) xf1(togunits1_decode(w, unit_ca))];

function togunits1_to_mm(what, dbgctxstr=undef) = togunits1_decode(what, [1,"mm"], dbgctxstr=dbgctxstr);
function togunits1_vec_to_mms(what) = togunits1_decode_vec(what, [1,"mm"]);
// file: ../lib/TOGMod1Constructors.scad
// TOGMod1Constructors-v1.11
// 
// Functions to construct objects understood by TOGMod1
// 
// v1.1:
// - Add togmod1_make_rounded_rect
// v1.2:
// - togmod1_make_rounded_rect can make ovals
// v1.3:
// - togmod1_circle_points, to just get the points of a circle
// - if pos parameter to circle function has a third element,
//   returned vertexes will include it as the z component;
// v1.3.1
// - Some assertions
// v1.4:
// - Refactor togmod1_rounded_rect_points and togmod1_circle_points
//   to use togmod1__make_nd_vector_adder for adapting to whatever
//   `pos` parameter is.
// v1.5:
// - togmod_rounded_rect_points will not simplify completely rounded sides
//   (where length of side is exactly twice the rounding radius)
//   unless simplify_rounded_sides=true
//   - This makes it more useful for polyhedron generation,
//     where radius varies, but number of points must remain constant.
// v1.6:
// - togmod1_make_rect makes a simple rectangle
// - togmod1_make_rounded_rect will defer to togmod1_make_rect when r=0
// v1.7:
// - togmod1_make_circle will return empty shape (["union"]) when d=0
// v1.8:
// - Add togmod1_text
// v1.9:
// - togmod1_circle_points uses 3 as minimum circle point count instead of 6
// v1.10:
// - Fix togmod1_linear_extrude_y so that range corresponds to Y start/end and
//   polygon X,Y correspond to X,Z.  Previously it was rotated wrongly,
//   which would have gone unnoticed for symmetrical shapes centered at 0,0.
// v1.11:
// - Remove an 'echo'

use <./TOGArrayLib1.scad>

function togmod1__make_nd_vector_adder(origin=[0,0]) =
	let(origin_is_zero = tal1_reduce(true, origin, function(prev,item) prev && item == 0))
	origin_is_zero ? (function(vec) len(vec) >= len(origin) ? vec : tal1_replace_at(origin, 0, vec)) :
	function(vec) [
		for(i=[0:1:max(len(origin),len(vec))-1]) (len(vec) > i ? vec[i] : 0) + (len(origin) > i ? origin[i] : 0),
	];

assert([1,2,3] == togmod1__make_nd_vector_adder()([1,2,3]));
assert([1,2,3] == togmod1__make_nd_vector_adder([0,0,3])([1,2]));


function togmod1_make_cuboid(size) =
	assert(is_list(size))
	assert(len(size) >= 3)
	assert(is_num(size[0]))
	assert(is_num(size[1]))
	assert(is_num(size[2]))
	["polyhedron-vf", [
		[-size[0]/2, -size[1]/2, -size[2]/2],
		[+size[0]/2, -size[1]/2, -size[2]/2],
		[-size[0]/2, +size[1]/2, -size[2]/2],
		[+size[0]/2, +size[1]/2, -size[2]/2],
		[-size[0]/2, -size[1]/2, +size[2]/2],
		[+size[0]/2, -size[1]/2, +size[2]/2],
		[-size[0]/2, +size[1]/2, +size[2]/2],
		[+size[0]/2, +size[1]/2, +size[2]/2]
	], [
		[0,1,3,2],[0,4,5,1],[4,6,7,5],[3,7,6,2],[1,5,7,3],[6,4,0,2]
	]];

function togmod1_make_polygon(verts) =
	["polygon-vp", verts, [[for( i=[0:1:len(verts)-1] ) i%len(verts)]]];

function togmod1_rounded_rect_points(size, r, pos=[0,0], simplify_rounded_sides=false) =
	assert(is_list(size))
	assert(len(size) >= 2)
	let(radii = is_list(r) ? r : is_num(r) ? [r,r] : assert(false, "rounded_rect r(adius) should be list<num> or num"))
	let(rx = radii[0])
	let(ry = radii[1])
	assert(is_num(rx))
	assert(is_num(ry))
	assert(size[0] >= 2*rx, str("size[0] must be >= 2*r[0]; size[0] = ",size[0],", 2*r[0] = ",2*rx))
	assert(size[1] >= 2*ry, str("size[1] must be >= 2*r[1]; size[1] = ",size[1],", 2*r[1] = ",2*ry))
	let(quarterfn=max($fn/4, 1))
	let(qfnx = simplify_rounded_sides && size[0] == 2*rx ? quarterfn-1 : quarterfn)
	let(qfny = simplify_rounded_sides && size[1] == 2*ry ? quarterfn-1 : quarterfn)
	let(finalizepos = togmod1__make_nd_vector_adder(pos))
[
	for(a=[0 : 1 : qfnx]) let(ang=      a*90/quarterfn) finalizepos([ size[0]/2-rx + rx*cos(ang),  size[1]/2-ry + ry*sin(ang)]),
	for(a=[0 : 1 : qfny]) let(ang= 90 + a*90/quarterfn) finalizepos([-size[0]/2+rx + rx*cos(ang),  size[1]/2-ry + ry*sin(ang)]),
	for(a=[0 : 1 : qfnx]) let(ang=180 + a*90/quarterfn) finalizepos([-size[0]/2+rx + rx*cos(ang), -size[1]/2+ry + ry*sin(ang)]),
	for(a=[0 : 1 : qfny]) let(ang=270 + a*90/quarterfn) finalizepos([ size[0]/2-rx + rx*cos(ang), -size[1]/2+ry + ry*sin(ang)]),
];

function togmod1_make_rect(size) =
	togmod1_make_polygon([
		[-size[0]/2, -size[1]/2],
		[+size[0]/2, -size[1]/2],
		[+size[0]/2, +size[1]/2],
		[-size[0]/2, +size[1]/2],
	]);

function togmod1_make_rounded_rect(size, r) =
	r == 0 ? togmod1_make_rect(size) :
	togmod1_make_polygon(togmod1_rounded_rect_points(size,r,simplify_rounded_sides=true));

/**
 * Returns points for an approximation of a circle where points are at distance r from pos.
 * Can be used to make other regular polygons, but the faces will be less than that
 * distance from pos (do some trig if you want face distance, e.g. for a hex nut).
 */
function togmod1_circle_points(r, pos=[0,0], d=undef) =
	assert( !is_undef(r) || !is_undef(d) )
	assert(!is_undef(pos[0]))
	assert(!is_undef(pos[1]))
	let(finalizepos = togmod1__make_nd_vector_adder(pos))
	let(r_ = !is_undef(r) ? r : d/2)
	let(fn = max($fn, 3))
	[for(i=[0 : 1 : fn-1]) finalizepos([r_*cos(i*360/fn), r_*sin(i*360/fn)])];

function togmod1_make_circle(r, pos=[0,0], d=undef) =
	r == 0 || d == 0 ? ["union"] :
	togmod1_make_polygon(togmod1_circle_points(r=r, pos=pos, d=d));

function togmod1_make_cylinder(d, zrange=[0,1], r=undef, pos=[0,0]) =
	assert( !is_undef(r) || !is_undef(d) )
	let( r_ = !is_undef(r) ? r : d/2 )
	// TODO: Make polyhedron directly
	["linear-extrude-zs", zrange, togmod1_make_circle(r=r_, pos=pos)];

function togmod1__is_range1d(range) = is_list(range) && len(range) == 2 && is_num(range[0]) && is_num(range[1]);

function togmod1_linear_extrude_z(range, shape) =
	assert(togmod1__is_range1d(range))
	["linear-extrude-zs", range, shape];
function togmod1_linear_extrude_x(range, shape) =
	assert(togmod1__is_range1d(range))
	["rotate", [90, 0, 90], togmod1_linear_extrude_z(range, shape)];
function togmod1_linear_extrude_y(range, shape) =
	assert(togmod1__is_range1d(range))
	["rotate", [90, 0,  0], togmod1_linear_extrude_z([-range[1], -range[0]], shape)];

function togmod1_text(text, size, font, halign, valign, spacing, direction, language, script) =
	["text-tsfhvsdls", text, size, font, halign, valign, spacing, direction, language, script];
// file: ../lib/TOGMod1.scad
// TOGMod1.9
// OpenSCAD library for representing shapes
// 
// See also: Functional OpenSCAD (https://github.com/thehans/FunctionalOpenSCAD)
// 
// v1.8:
// - Add `text-tsfhvsdls`
// v1.9
// - Add `offset-ds` (offset with _d_elta a _s_hape)

module togmod1_domodule(mod) {
	assert(is_list(mod));
	assert(len(mod) > 0);
	if( mod[0] == "polygon-vp" ) {
		// ["polygon-vp", vertexes, paths]
		polygon(points=mod[1], paths=mod[2]);
	} else if( mod[0] == "polyhedron-vf" ) {
		polyhedron(mod[1], faces=mod[2]);
	} else if( mod[0] == "scale" ) {
		assert(len(mod) == 3);
		scale(mod[1]) togmod1_domodule(mod[2]);
	} else if( mod[0] == "translate" ) {
		assert(len(mod) == 3);
		assert(is_list(mod[1]));
		for(c=mod[1]) assert(is_num(c), "translate component should be numeric");
		translate(mod[1]) togmod1_domodule(mod[2]);
	} else if( mod[0] == "rotate" ) {
		assert(len(mod) == 3);
		rotate(mod[1]) togmod1_domodule(mod[2]);
	} else if( mod[0] == "intersection" ) {
		intersection_for( i=[1:1:len(mod)-1] ) togmod1_domodule(mod[i]);
	} else if( mod[0] == "difference" ) {
		difference() {
			togmod1_domodule(mod[1]);
			for( i=[2:1:len(mod)-1] ) togmod1_domodule(mod[i]);
		}
	} else if( mod[0] == "union" ) {
		for( i=[1:1:len(mod)-1] ) togmod1_domodule(mod[i]);
	} else if( mod[0] == "hull" ) {
		hull() for( i=[1:1:len(mod)-1] ) togmod1_domodule(mod[i]);
	} else if( mod[0] == "offset-rs" ) {
		assert(len(mod) == 3);
		assert(is_num(mod[1]));
		assert(is_list(mod[2]));
		offset(mod[1]) togmod1_domodule(mod[2]);
	} else if( mod[0] == "linear-extrude-zs" ) {
		// ["linear-extrude-zs", [z0,z1], 2d_shape] // centered
		// ["linear-extrude-zs", height, 2d_shape]
		let( zrange = is_list(mod[1]) ? mod[1] : [-mod[1]/2, mod[1]/2] ) {
			translate([0,0,zrange[0]]) linear_extrude(zrange[1]-zrange[0]) togmod1_domodule(mod[2]);
		}
	} else if( mod[0] == "render" ) {
		render() togmod1_domodule(mod[1]);
	} else if( mod[0] == "minkowski" ) {
		minkowski() {
			togmod1_domodule(mod[1]);
			togmod1_domodule(mod[2]);
		}
	} else if( mod[0] == "x-debug" ) {
		# togmod1_domodule(mod[1]);
	} else if( mod[0] == "x-color" ) {
		color(mod[1]) togmod1_domodule(mod[2]);
	} else if( mod[0] == "text-tsfhvsdls" ) {
		text(text=mod[1], size=mod[2], font=mod[3], halign=mod[4], valign=mod[5], spacing=mod[6], direction=mod[7], language=mod[7], script=mod[8]);
	} else if( mod[0] == "offset-ds" ) {
		assert(is_num(mod[1]));
		assert(is_list(mod[2]));
		offset(delta=mod[1]) togmod1_domodule(mod[2]);
	} else {
		assert(false, str("Unrecognized shape: ", mod[0]));
	}
}
// main file
// GX12SolderingHolder0.1
// 
// Panel for holding GX12 ports (electrically 'male')
// at a convenient angle for soldering the pins.

size_chunks = [4,1];
thickness = "1/8inch";
$fn = 48;

use <../lib/TOGMod1.scad>
use <../lib/TOGMod1Constructors.scad>
use <../lib/TOGUnits1.scad>

chunk = togunits1_decode("1chunk");

size_ca      = [for(d=size_chunks) [d,"chunk"]];

thickness_mm = togunits1_to_mm(thickness);
size_mm      = togunits1_vec_to_mms(size_ca);

mounting_hole_2d = togmod1_make_circle(d=togunits1_decode("5/16inch"));
gx12_hole_2d     = togmod1_make_circle(d=12.1);

togmod1_domodule(togmod1_linear_extrude_z([0, thickness_mm], ["difference",
	togmod1_make_rounded_rect(size_mm, r=togunits1_to_mm("3/16inch")),
	
	for( ym=[-size_chunks[1]/2 + 0.5 : 1 : size_chunks[1]/2 - 0.5] ) each [
		for( xm=[-size_chunks[0]/2 + 0.5, size_chunks[0]/2 - 0.5] ) ["translate", [xm*chunk,ym*chunk], mounting_hole_2d],
		for( xm=[-size_chunks[0]/2 + 1.5 : 1 : size_chunks[0]/2 - 1.5] ) ["translate", [xm*chunk,ym*chunk], gx12_hole_2d],
	],
]));
